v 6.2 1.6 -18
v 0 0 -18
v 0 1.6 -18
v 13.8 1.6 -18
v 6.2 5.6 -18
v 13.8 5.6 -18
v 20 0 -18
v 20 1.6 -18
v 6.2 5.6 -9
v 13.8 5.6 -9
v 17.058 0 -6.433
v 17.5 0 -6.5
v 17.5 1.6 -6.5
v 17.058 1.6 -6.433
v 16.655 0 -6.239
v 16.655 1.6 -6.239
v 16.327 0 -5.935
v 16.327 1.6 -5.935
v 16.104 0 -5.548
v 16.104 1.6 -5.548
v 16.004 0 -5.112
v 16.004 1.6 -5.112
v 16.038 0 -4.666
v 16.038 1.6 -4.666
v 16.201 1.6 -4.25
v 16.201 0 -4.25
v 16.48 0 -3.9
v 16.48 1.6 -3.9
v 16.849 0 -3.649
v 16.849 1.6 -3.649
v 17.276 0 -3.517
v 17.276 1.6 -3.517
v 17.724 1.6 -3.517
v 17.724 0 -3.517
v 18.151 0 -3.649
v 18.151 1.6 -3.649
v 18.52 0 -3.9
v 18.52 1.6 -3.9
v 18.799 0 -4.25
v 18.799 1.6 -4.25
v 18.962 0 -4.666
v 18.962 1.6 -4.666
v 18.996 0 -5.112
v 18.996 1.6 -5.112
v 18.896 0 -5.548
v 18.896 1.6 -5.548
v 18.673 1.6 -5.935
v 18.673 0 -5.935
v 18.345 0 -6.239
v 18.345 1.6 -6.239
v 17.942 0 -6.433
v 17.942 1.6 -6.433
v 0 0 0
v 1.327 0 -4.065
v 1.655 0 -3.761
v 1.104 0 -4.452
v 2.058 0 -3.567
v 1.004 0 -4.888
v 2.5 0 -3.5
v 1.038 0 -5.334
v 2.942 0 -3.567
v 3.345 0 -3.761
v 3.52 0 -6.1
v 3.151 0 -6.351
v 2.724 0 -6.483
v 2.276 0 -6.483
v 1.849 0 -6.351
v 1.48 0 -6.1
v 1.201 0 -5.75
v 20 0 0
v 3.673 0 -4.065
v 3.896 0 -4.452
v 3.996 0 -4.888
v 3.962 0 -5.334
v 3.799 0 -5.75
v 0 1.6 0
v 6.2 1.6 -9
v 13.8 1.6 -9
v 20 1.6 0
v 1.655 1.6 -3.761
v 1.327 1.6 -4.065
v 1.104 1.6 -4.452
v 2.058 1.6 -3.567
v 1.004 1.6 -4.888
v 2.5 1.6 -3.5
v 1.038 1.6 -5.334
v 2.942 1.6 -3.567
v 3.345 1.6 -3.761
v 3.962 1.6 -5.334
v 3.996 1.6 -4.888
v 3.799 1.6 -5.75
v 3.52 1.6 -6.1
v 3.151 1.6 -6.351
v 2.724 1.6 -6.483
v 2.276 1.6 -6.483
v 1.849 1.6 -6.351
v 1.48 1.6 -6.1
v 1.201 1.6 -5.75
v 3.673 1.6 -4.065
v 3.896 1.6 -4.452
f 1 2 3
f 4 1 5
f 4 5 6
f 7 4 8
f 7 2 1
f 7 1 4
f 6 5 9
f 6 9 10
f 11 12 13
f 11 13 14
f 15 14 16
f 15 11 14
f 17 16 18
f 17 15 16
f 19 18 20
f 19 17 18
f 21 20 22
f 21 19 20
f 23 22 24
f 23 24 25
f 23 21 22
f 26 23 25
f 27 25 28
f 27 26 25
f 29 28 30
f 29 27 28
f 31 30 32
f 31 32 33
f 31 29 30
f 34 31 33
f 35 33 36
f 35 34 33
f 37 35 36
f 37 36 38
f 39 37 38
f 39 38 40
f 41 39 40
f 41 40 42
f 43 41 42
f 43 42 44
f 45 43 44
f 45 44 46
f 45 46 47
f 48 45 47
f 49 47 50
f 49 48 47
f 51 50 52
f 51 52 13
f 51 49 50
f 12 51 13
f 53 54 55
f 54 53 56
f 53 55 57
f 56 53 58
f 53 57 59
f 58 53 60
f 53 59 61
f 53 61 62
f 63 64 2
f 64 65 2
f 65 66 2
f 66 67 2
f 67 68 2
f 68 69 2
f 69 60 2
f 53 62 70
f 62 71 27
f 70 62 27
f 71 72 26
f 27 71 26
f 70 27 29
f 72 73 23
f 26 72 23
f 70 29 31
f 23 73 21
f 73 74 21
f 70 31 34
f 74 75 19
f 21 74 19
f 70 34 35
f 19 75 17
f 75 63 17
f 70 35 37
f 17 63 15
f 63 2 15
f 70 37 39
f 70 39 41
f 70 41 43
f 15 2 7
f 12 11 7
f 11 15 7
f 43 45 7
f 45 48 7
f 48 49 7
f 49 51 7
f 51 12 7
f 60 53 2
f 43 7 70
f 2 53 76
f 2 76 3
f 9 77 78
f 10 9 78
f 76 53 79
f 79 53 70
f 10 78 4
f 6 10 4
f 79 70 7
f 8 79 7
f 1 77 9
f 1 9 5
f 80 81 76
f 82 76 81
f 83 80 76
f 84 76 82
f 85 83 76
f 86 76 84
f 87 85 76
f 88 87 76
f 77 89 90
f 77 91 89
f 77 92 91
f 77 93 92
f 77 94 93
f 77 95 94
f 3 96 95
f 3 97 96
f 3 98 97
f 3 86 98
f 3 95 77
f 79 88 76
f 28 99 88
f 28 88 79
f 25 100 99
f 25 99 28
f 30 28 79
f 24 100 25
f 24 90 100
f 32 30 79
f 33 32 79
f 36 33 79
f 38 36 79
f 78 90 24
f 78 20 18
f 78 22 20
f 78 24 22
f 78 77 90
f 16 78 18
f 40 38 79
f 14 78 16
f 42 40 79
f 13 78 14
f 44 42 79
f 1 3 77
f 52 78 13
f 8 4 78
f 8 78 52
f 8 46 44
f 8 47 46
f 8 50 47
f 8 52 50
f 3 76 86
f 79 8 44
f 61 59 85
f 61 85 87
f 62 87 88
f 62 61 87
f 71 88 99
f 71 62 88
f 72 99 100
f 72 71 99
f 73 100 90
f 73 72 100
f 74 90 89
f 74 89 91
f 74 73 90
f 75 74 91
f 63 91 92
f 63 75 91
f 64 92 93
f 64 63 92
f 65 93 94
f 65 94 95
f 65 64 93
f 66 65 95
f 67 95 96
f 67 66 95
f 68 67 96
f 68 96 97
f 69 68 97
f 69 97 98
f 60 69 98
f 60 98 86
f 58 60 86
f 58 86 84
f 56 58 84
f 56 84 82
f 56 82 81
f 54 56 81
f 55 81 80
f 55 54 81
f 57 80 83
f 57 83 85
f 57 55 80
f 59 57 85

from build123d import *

# Parameters (mm, degrees)
SKETCH_1_W      = 20
SKETCH_1_H      = 18
SKETCH_1_R      = 1.5
EXTRUDE_1_DEPTH = 1.6
SKETCH_2_W      = 7.6
SKETCH_2_H      = 9
EXTRUDE_2_DEPTH = 4


with BuildPart() as part:
    # 草图1 → 凸台-拉伸1 (new body)
    with BuildSketch(Plane(origin=(0, 0, 0), x_dir=(1, 0, 0), z_dir=(0, 1, 0))):
        with Locations((10, 9)):
            Rectangle(SKETCH_1_W, SKETCH_1_H)
        with Locations(Location((2.5, 5, 0), (0, 0, 270))):
            Circle(SKETCH_1_R, mode=Mode.SUBTRACT)
        with Locations(Location((17.5, 5, 0), (0, 0, 90))):
            Circle(SKETCH_1_R, mode=Mode.SUBTRACT)
    extrude(amount=EXTRUDE_1_DEPTH)

    # 草图2 → 凸台-拉伸2 (add)
    with BuildSketch(Plane(origin=(0, 1.6, 0), x_dir=(1, 0, 0), z_dir=(0, 1, 0))):
        with Locations((10, 13.5)):
            Rectangle(SKETCH_2_W, SKETCH_2_H)
    extrude(amount=EXTRUDE_2_DEPTH)


solid = part.part
